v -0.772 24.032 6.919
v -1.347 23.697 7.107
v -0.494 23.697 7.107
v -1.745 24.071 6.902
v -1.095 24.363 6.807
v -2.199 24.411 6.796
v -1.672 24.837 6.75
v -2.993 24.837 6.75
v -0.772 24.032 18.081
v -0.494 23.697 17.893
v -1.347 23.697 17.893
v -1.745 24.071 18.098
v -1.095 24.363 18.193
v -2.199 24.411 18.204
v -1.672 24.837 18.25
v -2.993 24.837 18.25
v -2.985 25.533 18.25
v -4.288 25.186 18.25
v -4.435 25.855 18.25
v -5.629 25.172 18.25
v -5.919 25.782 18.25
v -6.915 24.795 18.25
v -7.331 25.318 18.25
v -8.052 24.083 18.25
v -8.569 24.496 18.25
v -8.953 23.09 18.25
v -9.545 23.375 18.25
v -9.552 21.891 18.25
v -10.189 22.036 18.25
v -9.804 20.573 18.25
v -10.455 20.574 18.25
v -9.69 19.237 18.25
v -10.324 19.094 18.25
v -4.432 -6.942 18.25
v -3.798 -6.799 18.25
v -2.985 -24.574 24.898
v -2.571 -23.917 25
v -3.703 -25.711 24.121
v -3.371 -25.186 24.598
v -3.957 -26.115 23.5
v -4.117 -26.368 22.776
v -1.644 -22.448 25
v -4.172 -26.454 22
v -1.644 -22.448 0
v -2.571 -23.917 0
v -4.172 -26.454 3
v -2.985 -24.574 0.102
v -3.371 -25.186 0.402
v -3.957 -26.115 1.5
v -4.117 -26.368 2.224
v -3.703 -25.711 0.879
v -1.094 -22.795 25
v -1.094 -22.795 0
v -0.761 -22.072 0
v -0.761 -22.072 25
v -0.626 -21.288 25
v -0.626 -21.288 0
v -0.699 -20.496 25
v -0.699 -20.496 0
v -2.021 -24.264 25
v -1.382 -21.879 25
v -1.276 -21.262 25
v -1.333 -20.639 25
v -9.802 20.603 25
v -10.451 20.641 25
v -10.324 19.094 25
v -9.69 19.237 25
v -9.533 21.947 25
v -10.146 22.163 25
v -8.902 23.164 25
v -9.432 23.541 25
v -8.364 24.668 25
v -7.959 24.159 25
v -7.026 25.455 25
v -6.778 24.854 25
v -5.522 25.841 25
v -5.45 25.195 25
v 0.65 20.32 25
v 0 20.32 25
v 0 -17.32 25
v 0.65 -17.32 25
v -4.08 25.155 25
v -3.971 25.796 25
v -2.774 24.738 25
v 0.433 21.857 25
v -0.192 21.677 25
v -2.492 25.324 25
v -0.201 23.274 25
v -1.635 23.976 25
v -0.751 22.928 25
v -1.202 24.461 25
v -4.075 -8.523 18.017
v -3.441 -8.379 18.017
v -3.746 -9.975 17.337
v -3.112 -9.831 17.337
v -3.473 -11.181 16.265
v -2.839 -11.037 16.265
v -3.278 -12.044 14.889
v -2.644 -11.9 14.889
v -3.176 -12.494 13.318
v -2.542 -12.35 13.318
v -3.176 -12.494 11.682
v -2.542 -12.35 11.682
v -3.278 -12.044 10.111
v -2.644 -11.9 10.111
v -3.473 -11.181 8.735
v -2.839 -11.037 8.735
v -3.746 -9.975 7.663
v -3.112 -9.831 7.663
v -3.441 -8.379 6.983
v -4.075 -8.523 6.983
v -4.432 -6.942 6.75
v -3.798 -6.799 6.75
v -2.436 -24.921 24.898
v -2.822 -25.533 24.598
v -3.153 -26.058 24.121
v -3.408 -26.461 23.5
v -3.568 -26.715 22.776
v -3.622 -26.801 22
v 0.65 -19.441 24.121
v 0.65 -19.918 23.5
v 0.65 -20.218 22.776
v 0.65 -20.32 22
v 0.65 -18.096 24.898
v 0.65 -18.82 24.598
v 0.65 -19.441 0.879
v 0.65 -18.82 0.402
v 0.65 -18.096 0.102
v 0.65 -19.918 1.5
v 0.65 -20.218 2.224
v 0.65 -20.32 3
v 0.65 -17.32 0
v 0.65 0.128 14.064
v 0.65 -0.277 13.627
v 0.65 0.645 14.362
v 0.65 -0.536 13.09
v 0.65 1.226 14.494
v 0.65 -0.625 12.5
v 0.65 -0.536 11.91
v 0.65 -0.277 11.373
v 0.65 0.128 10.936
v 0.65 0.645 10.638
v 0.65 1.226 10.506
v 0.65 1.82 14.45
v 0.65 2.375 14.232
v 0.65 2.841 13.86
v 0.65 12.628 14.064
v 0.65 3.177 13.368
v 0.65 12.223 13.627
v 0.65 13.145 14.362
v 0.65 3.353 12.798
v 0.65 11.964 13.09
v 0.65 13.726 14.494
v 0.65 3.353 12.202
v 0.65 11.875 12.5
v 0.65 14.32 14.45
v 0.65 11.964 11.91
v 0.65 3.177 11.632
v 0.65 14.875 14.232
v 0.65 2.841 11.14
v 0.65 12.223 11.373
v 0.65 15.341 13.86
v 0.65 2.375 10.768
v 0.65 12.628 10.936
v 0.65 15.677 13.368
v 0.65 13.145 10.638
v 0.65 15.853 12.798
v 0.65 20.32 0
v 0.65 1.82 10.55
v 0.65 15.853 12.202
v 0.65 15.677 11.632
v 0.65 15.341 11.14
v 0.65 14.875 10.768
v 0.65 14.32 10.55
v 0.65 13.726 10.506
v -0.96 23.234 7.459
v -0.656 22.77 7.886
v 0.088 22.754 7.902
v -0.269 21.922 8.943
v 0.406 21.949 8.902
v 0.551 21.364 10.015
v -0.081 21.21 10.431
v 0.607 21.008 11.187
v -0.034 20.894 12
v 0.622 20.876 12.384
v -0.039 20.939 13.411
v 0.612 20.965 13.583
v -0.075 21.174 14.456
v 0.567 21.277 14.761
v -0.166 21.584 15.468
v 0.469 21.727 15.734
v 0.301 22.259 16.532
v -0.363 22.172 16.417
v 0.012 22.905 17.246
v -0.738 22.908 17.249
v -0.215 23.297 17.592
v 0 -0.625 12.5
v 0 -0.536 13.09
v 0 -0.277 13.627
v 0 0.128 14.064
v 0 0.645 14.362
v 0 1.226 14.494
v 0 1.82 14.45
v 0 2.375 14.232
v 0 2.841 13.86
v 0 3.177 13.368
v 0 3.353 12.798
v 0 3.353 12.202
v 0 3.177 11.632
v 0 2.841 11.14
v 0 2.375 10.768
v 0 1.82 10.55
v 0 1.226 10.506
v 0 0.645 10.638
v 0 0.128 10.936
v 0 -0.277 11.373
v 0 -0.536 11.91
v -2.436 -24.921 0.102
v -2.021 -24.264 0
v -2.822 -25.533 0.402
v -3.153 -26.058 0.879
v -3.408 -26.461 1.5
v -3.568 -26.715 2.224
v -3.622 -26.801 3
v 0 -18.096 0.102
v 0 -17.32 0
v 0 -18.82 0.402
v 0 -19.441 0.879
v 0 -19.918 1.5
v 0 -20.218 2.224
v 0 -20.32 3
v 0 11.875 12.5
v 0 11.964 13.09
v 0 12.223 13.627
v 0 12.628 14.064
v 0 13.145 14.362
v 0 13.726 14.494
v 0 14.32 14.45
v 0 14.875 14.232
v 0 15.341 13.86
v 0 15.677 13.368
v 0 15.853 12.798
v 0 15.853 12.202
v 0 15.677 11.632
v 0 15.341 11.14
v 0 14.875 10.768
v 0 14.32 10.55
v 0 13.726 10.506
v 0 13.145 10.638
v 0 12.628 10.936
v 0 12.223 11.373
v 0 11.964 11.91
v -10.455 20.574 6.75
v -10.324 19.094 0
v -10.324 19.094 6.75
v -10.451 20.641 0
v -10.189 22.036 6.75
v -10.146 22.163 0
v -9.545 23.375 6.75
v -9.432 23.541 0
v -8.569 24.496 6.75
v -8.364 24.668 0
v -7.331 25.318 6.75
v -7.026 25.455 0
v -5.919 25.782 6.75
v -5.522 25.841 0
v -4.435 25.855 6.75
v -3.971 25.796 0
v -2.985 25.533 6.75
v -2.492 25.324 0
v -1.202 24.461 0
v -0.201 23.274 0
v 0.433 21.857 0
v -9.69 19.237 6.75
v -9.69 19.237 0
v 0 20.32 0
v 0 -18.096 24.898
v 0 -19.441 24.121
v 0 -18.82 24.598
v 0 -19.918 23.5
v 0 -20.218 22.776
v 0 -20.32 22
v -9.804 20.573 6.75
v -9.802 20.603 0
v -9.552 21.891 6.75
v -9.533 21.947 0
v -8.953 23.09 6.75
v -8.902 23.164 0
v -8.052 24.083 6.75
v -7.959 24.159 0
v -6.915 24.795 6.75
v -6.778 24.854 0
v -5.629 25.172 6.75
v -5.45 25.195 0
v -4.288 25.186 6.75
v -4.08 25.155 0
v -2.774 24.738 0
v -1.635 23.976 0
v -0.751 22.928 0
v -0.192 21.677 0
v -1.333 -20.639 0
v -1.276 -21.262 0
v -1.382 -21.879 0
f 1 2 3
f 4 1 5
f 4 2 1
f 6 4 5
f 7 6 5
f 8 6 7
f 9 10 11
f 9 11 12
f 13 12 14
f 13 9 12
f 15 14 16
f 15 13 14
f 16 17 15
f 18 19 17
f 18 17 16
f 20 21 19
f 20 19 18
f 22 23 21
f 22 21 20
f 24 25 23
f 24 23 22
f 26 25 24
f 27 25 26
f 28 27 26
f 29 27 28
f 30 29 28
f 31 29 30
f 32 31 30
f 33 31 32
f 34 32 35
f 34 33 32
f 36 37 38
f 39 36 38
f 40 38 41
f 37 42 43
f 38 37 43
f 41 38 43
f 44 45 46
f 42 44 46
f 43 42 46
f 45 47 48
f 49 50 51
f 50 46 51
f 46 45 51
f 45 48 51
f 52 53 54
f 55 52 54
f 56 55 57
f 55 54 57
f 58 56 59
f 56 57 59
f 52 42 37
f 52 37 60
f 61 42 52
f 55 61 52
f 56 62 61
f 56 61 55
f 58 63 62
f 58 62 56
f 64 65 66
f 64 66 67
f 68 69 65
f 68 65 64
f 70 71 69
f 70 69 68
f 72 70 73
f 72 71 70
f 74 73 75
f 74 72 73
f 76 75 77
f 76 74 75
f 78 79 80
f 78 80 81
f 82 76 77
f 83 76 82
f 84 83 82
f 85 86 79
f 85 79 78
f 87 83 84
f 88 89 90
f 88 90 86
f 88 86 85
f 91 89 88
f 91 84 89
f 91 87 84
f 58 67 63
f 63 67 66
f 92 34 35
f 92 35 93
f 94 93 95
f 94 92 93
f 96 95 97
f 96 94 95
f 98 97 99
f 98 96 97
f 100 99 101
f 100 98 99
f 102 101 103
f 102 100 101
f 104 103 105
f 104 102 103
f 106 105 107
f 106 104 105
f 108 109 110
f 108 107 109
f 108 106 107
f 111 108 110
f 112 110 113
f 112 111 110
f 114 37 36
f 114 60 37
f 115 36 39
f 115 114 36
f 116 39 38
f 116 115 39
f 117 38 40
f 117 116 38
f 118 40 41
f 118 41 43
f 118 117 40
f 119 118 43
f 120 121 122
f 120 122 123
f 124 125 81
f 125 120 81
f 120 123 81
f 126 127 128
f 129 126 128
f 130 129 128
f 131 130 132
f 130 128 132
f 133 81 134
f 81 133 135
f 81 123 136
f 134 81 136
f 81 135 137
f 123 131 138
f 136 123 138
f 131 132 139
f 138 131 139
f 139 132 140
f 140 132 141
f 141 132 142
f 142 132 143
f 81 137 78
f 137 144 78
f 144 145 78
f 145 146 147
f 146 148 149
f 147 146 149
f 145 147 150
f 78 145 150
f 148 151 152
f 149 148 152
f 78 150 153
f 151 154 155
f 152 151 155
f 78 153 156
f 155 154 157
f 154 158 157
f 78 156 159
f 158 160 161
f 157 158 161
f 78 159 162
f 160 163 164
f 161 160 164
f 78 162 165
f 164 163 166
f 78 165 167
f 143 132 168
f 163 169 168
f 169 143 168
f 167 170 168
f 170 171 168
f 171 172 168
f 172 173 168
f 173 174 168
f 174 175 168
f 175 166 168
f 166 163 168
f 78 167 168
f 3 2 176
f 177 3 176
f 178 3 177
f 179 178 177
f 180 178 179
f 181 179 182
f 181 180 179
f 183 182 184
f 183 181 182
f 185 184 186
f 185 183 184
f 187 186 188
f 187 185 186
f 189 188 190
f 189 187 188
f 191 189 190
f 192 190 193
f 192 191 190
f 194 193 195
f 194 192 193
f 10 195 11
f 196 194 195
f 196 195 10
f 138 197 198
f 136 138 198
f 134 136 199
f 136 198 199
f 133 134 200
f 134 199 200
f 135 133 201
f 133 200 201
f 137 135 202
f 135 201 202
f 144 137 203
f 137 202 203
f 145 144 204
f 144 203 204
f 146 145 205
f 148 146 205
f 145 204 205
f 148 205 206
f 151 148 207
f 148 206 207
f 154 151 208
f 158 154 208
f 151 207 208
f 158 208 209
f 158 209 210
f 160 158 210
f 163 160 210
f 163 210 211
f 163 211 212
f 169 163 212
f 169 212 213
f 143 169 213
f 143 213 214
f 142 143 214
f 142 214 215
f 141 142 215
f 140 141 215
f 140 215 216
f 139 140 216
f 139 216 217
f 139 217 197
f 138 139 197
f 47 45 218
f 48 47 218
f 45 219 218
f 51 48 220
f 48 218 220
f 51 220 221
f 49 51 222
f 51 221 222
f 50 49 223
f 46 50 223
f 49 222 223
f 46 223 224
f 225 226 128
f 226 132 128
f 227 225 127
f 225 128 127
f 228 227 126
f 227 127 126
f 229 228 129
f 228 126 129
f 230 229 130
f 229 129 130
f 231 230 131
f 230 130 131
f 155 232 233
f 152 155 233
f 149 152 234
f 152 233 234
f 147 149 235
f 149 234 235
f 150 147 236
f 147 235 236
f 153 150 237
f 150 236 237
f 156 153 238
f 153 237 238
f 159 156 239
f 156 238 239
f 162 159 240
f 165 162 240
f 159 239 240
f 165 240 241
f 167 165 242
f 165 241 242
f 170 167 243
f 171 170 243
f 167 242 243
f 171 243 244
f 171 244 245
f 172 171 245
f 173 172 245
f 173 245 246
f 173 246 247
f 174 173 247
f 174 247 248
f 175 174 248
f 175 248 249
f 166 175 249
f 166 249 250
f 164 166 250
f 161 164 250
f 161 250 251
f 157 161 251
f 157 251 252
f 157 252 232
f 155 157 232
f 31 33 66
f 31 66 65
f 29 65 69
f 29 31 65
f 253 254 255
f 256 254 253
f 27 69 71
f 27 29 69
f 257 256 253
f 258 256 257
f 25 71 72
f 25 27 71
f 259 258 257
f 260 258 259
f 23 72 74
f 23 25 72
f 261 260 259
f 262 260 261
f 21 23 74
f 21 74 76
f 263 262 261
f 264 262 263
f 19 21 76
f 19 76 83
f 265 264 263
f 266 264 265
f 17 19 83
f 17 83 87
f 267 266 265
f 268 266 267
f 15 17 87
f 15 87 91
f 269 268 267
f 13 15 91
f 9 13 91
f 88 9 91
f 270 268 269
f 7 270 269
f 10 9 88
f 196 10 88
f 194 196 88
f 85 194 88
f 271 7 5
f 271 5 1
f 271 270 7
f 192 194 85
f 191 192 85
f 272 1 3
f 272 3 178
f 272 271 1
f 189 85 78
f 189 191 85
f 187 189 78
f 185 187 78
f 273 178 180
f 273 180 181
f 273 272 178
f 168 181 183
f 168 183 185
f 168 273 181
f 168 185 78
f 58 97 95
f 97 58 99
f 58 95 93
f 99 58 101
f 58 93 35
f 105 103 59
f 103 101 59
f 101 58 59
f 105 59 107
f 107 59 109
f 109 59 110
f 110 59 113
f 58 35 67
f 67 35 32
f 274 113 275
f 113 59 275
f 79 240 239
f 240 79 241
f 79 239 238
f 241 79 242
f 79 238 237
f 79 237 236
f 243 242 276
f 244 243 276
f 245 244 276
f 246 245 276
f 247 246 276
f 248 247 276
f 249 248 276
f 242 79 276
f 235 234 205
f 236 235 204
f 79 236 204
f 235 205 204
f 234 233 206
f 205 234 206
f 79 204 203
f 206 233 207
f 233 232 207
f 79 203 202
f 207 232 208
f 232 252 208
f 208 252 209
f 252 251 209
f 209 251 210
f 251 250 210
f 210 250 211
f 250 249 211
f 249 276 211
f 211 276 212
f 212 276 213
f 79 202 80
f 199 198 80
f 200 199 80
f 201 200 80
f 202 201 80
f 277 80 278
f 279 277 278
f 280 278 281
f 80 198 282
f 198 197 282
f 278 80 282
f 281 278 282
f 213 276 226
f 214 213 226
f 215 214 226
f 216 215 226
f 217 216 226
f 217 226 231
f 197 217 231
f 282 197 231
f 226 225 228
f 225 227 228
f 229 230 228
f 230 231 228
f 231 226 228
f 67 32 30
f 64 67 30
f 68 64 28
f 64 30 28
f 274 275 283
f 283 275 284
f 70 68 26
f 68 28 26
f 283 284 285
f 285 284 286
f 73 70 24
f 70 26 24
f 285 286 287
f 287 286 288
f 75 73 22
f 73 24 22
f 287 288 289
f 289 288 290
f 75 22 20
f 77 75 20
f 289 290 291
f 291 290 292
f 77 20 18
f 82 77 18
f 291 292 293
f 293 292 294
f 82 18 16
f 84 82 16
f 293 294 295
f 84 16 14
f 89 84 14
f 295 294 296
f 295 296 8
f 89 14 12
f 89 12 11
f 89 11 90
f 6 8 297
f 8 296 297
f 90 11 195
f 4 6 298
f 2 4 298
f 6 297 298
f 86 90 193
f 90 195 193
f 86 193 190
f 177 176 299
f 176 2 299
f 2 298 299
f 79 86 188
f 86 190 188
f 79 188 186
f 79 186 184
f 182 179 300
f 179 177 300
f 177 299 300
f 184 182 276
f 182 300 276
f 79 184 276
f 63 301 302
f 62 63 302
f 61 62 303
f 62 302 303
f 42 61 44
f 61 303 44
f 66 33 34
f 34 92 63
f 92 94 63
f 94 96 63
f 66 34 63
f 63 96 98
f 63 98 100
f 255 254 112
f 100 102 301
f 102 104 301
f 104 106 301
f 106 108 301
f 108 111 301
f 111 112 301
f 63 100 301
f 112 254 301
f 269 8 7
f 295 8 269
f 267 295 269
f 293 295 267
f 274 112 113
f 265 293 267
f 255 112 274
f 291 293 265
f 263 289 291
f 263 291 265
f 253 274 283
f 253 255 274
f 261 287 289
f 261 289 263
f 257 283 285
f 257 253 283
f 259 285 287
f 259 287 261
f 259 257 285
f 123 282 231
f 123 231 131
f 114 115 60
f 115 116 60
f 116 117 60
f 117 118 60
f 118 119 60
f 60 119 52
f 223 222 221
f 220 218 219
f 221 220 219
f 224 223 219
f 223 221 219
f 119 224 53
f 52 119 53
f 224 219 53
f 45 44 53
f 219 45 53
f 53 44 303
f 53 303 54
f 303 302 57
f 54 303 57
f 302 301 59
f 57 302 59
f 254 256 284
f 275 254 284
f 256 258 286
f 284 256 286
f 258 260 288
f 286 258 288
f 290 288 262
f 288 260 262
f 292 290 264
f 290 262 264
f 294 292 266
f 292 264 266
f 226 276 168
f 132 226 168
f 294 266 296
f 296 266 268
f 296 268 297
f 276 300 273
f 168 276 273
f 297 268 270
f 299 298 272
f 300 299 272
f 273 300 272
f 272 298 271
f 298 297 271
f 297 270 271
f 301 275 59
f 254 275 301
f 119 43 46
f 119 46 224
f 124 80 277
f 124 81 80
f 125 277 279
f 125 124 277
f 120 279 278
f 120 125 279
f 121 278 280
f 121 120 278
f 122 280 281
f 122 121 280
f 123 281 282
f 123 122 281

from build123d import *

# Parameters (mm, degrees)
EXTRUDE_THIN1_DEPTH              = 25
CUT_EXTRUDE1_REACH               = 41.464
CUT_EXTRUDE1_OFFSET_FROM_SURFACE = 2
CUT_EXTRUDE2_DEPTH               = 39.114790536728684
CUT_EXTRUDE2_DEPTH_BACK          = 39.114790536728684
FILLET1_R                        = 2
FILLET2_R                        = 3
SKETCH4_R                        = 1.9999999999999996
CUT_EXTRUDE3_DEPTH               = 39.11479062976518


with BuildPart() as part:
    # Sketch1 → Extrude-Thin1 (new body)
    with BuildSketch(Plane.XY):
        with BuildLine():
            Line((-3.622105329640586, -26.801338649985606), (-1.0941188006005313, -22.79472249406353))
            ThreePointArc((-1.0941188006005313, -22.79472249406353), (-0.66792233314523, -21.684442737284584), (-0.6990538082442912, -20.49557966760723))
            Line((-0.6990538082442912, -20.49557966760723), (-9.68971050504969, 19.237405741595826))
            ThreePointArc((-9.68971050504969, 19.237405741595826), (-5.449997394886004, 25.195000000000007), (0, 20.320000000000004))
            Line((0, 20.320000000000004), (0, -20.320000000000004))
            Line((0, -20.320000000000004), (0.65, -20.320000000000004))
            Line((0.65, -20.320000000000004), (0.65, 20.320000000000004))
            ThreePointArc((0.6499999999999986, 20.320000000000004), (-5.52217034544628, 25.840980700336655), (-10.323683013380226, 19.093952408831854))
            Line((-10.323683013380226, 19.093952408831854), (-1.3330263165748255, -20.639033000371203))
            ThreePointArc((-1.3330263165748275, -20.639033000371192), (-1.3085337715329808, -21.57436555978272), (-1.6438418847081215, -22.4478730587184))
            Line((-1.6438418847081135, -22.447873058718383), (-4.171828413748168, -26.454489214640457))
            Line((-4.171828413748168, -26.454489214640457), (-3.622105329640586, -26.801338649985606))
        make_face()
    extrude(amount=EXTRUDE_THIN1_DEPTH)

    # Cut-Extrude1: up to this face of the body (flat: up to its plane, moved by the offset)
    cut_extrude1_end = Plane(part.part.faces().sort_by_distance((0, 0, 12.5))[0]).offset(CUT_EXTRUDE1_OFFSET_FROM_SURFACE)
    # Sketch2 → Cut-Extrude1 (cut, up to the picked face)
    with BuildSketch(Plane(origin=(-5.7107644938092665, -1.2922140763239114, 0), x_dir=(0, 0, 1), z_dir=(-0.9753423205085142, -0.22069743502149478, 0)), mode=Mode.PRIVATE) as cut_extrude1_sk1:
        with BuildLine():
            Line((18.249999999999996, 28.456882519592593), (18.25, -5.793117480407402))
            ThreePointArc((18.25, -5.793117480407402), (12.499999999999998, -11.5431174804074), (6.750000000000001, -5.793117480407404))
            Line((6.750000000000001, -5.793117480407404), (6.749999999999996, 28.456882519592593))
            ThreePointArc((6.749999999999996, 28.456882519592593), (12.499999999999995, 34.2068825195926), (18.249999999999996, 28.456882519592593))
        make_face()
    cut_extrude1_tool1 = split(extrude(cut_extrude1_sk1.sketch, amount=-CUT_EXTRUDE1_REACH, mode=Mode.PRIVATE), bisect_by=cut_extrude1_end, keep=Keep.BOTH, mode=Mode.PRIVATE)
    add(cut_extrude1_tool1.solids().sort_by(Axis((-8.211682, 9.760251, 12.5), (0.9753423205085142, 0.22069743502149478, 0)))[0], mode=Mode.SUBTRACT)

    # Sketch3 → Cut-Extrude2 (cut, two sides: drawn at the far end of the back side and taken through both)
    with BuildSketch(Plane.ZY.offset(-CUT_EXTRUDE2_DEPTH_BACK)):
        with BuildLine():
            Line((18.249999999999993, 24.27238272866149), (18.249999999999996, 25.05505662424576))
            Line((18.249999999999996, 25.05505662424576), (6.749999999999996, 25.05505662424576))
            Line((6.749999999999996, 25.05505662424576), (6.749999999999999, 24.27238272866149))
            ThreePointArc((6.749999999999999, 24.27238272866149), (12.499999999999995, 20.875332308455405), (18.249999999999993, 24.27238272866149))
        make_face()
    extrude(amount=CUT_EXTRUDE2_DEPTH + CUT_EXTRUDE2_DEPTH_BACK, mode=Mode.SUBTRACT)

    # Fillet1
    # the kernel refuses this fillet: 2 mm, written as the material it adds along each edge
    with BuildSketch(Plane(origin=(0.6919383663248766, 24.272382728661498, 18.25), x_dir=(0, -0.8498127825413853, -0.5270846560366448), z_dir=(-1, 0, 0))) as fillet1_piece_1_section:
        with BuildLine():
            CenterArc((0.5741727604103483, -1.997336805169661), FILLET1_R, 87.04285714004924, 34.765830441625596)
            Line((-0.47999655166291116, -0.29771124008687166), (0, 0))
            ThreePointArc((0, 0), (0.3386753487804471, 0.00874177622603999), (0.6773506975608955, 0))
        make_face()
    fillet1_piece_1 = extrude(amount=4.385315110227097, mode=Mode.PRIVATE)
    fillet1_piece_1 = fillet1_piece_1 & Plane(origin=(-4.905332308455408, 20.320000000000007, 18.185221139731127), x_dir=(1, -6.4e-16, 0), z_dir=(0, 0, -1)) * Cylinder(5.555332308455408, 12, mode=Mode.PRIVATE)
    fillet1_piece_1 = fillet1_piece_1 - Plane(origin=(-4.90533230845541, 20.320000000000007, 18.185221139731127), x_dir=(-0.9753423205085139, -0.220697435021496, 0), z_dir=(0, 0, -1)) * Cylinder(4.9053323084554075, 12, mode=Mode.PRIVATE)
    add(fillet1_piece_1)
    with BuildSketch(Plane(origin=(-3.6933767439022205, 24.272382728661498, 6.7499999999999964), x_dir=(0, 1, 0), z_dir=(1, 0, 0))) as fillet1_piece_2_section:
        with BuildLine():
            CenterArc((0.5648262317583601, 2), FILLET1_R, 235.23416955837342, 34.765830441626576)
            ThreePointArc((-0.5756212810506085, 0.35702115944001456), (-0.2924182966405411, 0.17108170654102572), (0, 0))
            Line((0, 0), (0.5648262317583601, 0))
        make_face()
    fillet1_piece_2 = extrude(amount=4.385315110227104, mode=Mode.PRIVATE)
    fillet1_piece_2 = fillet1_piece_2 - Plane(origin=(-4.90533230845541, 20.320000000000007, 6.814778786528934), x_dir=(-0.9753423205085139, -0.220697435021496, 0), z_dir=(0, 0, -1)) * Cylinder(4.9053323084554075, 12, mode=Mode.PRIVATE)
    fillet1_piece_2 = fillet1_piece_2 & Plane(origin=(-4.905332308455408, 20.320000000000007, 6.814778786528934), x_dir=(1, -6.4e-16, 0), z_dir=(0, 0, -1)) * Cylinder(5.555332308455408, 12, mode=Mode.PRIVATE)
    add(fillet1_piece_2)

    # Fillet2
    fillet2_edges = [part.edges().sort_by_distance(p)[0] for p in [
        (0.325, -20.320000000000004, 0),
        (-3.896966871694377, -26.62791393231303, 0),
        (0.325, -20.320000000000004, 25),
        (-3.896966871694377, -26.62791393231303, 25),
    ]]
    fillet(fillet2_edges, radius=FILLET2_R)

    # Sketch4 → Cut-Extrude3 (cut, through all)
    with BuildSketch(Plane.ZY):
        with Locations(Location((12.5, 13.875332308455407, 0), (0, 0, 270))):
            Circle(SKETCH4_R)
        with Locations(Location((12.5, 1.375332308455407, 0), (0, 0, 270))):
            Circle(SKETCH4_R)
    extrude(amount=-CUT_EXTRUDE3_DEPTH, mode=Mode.SUBTRACT)


solid = part.part
